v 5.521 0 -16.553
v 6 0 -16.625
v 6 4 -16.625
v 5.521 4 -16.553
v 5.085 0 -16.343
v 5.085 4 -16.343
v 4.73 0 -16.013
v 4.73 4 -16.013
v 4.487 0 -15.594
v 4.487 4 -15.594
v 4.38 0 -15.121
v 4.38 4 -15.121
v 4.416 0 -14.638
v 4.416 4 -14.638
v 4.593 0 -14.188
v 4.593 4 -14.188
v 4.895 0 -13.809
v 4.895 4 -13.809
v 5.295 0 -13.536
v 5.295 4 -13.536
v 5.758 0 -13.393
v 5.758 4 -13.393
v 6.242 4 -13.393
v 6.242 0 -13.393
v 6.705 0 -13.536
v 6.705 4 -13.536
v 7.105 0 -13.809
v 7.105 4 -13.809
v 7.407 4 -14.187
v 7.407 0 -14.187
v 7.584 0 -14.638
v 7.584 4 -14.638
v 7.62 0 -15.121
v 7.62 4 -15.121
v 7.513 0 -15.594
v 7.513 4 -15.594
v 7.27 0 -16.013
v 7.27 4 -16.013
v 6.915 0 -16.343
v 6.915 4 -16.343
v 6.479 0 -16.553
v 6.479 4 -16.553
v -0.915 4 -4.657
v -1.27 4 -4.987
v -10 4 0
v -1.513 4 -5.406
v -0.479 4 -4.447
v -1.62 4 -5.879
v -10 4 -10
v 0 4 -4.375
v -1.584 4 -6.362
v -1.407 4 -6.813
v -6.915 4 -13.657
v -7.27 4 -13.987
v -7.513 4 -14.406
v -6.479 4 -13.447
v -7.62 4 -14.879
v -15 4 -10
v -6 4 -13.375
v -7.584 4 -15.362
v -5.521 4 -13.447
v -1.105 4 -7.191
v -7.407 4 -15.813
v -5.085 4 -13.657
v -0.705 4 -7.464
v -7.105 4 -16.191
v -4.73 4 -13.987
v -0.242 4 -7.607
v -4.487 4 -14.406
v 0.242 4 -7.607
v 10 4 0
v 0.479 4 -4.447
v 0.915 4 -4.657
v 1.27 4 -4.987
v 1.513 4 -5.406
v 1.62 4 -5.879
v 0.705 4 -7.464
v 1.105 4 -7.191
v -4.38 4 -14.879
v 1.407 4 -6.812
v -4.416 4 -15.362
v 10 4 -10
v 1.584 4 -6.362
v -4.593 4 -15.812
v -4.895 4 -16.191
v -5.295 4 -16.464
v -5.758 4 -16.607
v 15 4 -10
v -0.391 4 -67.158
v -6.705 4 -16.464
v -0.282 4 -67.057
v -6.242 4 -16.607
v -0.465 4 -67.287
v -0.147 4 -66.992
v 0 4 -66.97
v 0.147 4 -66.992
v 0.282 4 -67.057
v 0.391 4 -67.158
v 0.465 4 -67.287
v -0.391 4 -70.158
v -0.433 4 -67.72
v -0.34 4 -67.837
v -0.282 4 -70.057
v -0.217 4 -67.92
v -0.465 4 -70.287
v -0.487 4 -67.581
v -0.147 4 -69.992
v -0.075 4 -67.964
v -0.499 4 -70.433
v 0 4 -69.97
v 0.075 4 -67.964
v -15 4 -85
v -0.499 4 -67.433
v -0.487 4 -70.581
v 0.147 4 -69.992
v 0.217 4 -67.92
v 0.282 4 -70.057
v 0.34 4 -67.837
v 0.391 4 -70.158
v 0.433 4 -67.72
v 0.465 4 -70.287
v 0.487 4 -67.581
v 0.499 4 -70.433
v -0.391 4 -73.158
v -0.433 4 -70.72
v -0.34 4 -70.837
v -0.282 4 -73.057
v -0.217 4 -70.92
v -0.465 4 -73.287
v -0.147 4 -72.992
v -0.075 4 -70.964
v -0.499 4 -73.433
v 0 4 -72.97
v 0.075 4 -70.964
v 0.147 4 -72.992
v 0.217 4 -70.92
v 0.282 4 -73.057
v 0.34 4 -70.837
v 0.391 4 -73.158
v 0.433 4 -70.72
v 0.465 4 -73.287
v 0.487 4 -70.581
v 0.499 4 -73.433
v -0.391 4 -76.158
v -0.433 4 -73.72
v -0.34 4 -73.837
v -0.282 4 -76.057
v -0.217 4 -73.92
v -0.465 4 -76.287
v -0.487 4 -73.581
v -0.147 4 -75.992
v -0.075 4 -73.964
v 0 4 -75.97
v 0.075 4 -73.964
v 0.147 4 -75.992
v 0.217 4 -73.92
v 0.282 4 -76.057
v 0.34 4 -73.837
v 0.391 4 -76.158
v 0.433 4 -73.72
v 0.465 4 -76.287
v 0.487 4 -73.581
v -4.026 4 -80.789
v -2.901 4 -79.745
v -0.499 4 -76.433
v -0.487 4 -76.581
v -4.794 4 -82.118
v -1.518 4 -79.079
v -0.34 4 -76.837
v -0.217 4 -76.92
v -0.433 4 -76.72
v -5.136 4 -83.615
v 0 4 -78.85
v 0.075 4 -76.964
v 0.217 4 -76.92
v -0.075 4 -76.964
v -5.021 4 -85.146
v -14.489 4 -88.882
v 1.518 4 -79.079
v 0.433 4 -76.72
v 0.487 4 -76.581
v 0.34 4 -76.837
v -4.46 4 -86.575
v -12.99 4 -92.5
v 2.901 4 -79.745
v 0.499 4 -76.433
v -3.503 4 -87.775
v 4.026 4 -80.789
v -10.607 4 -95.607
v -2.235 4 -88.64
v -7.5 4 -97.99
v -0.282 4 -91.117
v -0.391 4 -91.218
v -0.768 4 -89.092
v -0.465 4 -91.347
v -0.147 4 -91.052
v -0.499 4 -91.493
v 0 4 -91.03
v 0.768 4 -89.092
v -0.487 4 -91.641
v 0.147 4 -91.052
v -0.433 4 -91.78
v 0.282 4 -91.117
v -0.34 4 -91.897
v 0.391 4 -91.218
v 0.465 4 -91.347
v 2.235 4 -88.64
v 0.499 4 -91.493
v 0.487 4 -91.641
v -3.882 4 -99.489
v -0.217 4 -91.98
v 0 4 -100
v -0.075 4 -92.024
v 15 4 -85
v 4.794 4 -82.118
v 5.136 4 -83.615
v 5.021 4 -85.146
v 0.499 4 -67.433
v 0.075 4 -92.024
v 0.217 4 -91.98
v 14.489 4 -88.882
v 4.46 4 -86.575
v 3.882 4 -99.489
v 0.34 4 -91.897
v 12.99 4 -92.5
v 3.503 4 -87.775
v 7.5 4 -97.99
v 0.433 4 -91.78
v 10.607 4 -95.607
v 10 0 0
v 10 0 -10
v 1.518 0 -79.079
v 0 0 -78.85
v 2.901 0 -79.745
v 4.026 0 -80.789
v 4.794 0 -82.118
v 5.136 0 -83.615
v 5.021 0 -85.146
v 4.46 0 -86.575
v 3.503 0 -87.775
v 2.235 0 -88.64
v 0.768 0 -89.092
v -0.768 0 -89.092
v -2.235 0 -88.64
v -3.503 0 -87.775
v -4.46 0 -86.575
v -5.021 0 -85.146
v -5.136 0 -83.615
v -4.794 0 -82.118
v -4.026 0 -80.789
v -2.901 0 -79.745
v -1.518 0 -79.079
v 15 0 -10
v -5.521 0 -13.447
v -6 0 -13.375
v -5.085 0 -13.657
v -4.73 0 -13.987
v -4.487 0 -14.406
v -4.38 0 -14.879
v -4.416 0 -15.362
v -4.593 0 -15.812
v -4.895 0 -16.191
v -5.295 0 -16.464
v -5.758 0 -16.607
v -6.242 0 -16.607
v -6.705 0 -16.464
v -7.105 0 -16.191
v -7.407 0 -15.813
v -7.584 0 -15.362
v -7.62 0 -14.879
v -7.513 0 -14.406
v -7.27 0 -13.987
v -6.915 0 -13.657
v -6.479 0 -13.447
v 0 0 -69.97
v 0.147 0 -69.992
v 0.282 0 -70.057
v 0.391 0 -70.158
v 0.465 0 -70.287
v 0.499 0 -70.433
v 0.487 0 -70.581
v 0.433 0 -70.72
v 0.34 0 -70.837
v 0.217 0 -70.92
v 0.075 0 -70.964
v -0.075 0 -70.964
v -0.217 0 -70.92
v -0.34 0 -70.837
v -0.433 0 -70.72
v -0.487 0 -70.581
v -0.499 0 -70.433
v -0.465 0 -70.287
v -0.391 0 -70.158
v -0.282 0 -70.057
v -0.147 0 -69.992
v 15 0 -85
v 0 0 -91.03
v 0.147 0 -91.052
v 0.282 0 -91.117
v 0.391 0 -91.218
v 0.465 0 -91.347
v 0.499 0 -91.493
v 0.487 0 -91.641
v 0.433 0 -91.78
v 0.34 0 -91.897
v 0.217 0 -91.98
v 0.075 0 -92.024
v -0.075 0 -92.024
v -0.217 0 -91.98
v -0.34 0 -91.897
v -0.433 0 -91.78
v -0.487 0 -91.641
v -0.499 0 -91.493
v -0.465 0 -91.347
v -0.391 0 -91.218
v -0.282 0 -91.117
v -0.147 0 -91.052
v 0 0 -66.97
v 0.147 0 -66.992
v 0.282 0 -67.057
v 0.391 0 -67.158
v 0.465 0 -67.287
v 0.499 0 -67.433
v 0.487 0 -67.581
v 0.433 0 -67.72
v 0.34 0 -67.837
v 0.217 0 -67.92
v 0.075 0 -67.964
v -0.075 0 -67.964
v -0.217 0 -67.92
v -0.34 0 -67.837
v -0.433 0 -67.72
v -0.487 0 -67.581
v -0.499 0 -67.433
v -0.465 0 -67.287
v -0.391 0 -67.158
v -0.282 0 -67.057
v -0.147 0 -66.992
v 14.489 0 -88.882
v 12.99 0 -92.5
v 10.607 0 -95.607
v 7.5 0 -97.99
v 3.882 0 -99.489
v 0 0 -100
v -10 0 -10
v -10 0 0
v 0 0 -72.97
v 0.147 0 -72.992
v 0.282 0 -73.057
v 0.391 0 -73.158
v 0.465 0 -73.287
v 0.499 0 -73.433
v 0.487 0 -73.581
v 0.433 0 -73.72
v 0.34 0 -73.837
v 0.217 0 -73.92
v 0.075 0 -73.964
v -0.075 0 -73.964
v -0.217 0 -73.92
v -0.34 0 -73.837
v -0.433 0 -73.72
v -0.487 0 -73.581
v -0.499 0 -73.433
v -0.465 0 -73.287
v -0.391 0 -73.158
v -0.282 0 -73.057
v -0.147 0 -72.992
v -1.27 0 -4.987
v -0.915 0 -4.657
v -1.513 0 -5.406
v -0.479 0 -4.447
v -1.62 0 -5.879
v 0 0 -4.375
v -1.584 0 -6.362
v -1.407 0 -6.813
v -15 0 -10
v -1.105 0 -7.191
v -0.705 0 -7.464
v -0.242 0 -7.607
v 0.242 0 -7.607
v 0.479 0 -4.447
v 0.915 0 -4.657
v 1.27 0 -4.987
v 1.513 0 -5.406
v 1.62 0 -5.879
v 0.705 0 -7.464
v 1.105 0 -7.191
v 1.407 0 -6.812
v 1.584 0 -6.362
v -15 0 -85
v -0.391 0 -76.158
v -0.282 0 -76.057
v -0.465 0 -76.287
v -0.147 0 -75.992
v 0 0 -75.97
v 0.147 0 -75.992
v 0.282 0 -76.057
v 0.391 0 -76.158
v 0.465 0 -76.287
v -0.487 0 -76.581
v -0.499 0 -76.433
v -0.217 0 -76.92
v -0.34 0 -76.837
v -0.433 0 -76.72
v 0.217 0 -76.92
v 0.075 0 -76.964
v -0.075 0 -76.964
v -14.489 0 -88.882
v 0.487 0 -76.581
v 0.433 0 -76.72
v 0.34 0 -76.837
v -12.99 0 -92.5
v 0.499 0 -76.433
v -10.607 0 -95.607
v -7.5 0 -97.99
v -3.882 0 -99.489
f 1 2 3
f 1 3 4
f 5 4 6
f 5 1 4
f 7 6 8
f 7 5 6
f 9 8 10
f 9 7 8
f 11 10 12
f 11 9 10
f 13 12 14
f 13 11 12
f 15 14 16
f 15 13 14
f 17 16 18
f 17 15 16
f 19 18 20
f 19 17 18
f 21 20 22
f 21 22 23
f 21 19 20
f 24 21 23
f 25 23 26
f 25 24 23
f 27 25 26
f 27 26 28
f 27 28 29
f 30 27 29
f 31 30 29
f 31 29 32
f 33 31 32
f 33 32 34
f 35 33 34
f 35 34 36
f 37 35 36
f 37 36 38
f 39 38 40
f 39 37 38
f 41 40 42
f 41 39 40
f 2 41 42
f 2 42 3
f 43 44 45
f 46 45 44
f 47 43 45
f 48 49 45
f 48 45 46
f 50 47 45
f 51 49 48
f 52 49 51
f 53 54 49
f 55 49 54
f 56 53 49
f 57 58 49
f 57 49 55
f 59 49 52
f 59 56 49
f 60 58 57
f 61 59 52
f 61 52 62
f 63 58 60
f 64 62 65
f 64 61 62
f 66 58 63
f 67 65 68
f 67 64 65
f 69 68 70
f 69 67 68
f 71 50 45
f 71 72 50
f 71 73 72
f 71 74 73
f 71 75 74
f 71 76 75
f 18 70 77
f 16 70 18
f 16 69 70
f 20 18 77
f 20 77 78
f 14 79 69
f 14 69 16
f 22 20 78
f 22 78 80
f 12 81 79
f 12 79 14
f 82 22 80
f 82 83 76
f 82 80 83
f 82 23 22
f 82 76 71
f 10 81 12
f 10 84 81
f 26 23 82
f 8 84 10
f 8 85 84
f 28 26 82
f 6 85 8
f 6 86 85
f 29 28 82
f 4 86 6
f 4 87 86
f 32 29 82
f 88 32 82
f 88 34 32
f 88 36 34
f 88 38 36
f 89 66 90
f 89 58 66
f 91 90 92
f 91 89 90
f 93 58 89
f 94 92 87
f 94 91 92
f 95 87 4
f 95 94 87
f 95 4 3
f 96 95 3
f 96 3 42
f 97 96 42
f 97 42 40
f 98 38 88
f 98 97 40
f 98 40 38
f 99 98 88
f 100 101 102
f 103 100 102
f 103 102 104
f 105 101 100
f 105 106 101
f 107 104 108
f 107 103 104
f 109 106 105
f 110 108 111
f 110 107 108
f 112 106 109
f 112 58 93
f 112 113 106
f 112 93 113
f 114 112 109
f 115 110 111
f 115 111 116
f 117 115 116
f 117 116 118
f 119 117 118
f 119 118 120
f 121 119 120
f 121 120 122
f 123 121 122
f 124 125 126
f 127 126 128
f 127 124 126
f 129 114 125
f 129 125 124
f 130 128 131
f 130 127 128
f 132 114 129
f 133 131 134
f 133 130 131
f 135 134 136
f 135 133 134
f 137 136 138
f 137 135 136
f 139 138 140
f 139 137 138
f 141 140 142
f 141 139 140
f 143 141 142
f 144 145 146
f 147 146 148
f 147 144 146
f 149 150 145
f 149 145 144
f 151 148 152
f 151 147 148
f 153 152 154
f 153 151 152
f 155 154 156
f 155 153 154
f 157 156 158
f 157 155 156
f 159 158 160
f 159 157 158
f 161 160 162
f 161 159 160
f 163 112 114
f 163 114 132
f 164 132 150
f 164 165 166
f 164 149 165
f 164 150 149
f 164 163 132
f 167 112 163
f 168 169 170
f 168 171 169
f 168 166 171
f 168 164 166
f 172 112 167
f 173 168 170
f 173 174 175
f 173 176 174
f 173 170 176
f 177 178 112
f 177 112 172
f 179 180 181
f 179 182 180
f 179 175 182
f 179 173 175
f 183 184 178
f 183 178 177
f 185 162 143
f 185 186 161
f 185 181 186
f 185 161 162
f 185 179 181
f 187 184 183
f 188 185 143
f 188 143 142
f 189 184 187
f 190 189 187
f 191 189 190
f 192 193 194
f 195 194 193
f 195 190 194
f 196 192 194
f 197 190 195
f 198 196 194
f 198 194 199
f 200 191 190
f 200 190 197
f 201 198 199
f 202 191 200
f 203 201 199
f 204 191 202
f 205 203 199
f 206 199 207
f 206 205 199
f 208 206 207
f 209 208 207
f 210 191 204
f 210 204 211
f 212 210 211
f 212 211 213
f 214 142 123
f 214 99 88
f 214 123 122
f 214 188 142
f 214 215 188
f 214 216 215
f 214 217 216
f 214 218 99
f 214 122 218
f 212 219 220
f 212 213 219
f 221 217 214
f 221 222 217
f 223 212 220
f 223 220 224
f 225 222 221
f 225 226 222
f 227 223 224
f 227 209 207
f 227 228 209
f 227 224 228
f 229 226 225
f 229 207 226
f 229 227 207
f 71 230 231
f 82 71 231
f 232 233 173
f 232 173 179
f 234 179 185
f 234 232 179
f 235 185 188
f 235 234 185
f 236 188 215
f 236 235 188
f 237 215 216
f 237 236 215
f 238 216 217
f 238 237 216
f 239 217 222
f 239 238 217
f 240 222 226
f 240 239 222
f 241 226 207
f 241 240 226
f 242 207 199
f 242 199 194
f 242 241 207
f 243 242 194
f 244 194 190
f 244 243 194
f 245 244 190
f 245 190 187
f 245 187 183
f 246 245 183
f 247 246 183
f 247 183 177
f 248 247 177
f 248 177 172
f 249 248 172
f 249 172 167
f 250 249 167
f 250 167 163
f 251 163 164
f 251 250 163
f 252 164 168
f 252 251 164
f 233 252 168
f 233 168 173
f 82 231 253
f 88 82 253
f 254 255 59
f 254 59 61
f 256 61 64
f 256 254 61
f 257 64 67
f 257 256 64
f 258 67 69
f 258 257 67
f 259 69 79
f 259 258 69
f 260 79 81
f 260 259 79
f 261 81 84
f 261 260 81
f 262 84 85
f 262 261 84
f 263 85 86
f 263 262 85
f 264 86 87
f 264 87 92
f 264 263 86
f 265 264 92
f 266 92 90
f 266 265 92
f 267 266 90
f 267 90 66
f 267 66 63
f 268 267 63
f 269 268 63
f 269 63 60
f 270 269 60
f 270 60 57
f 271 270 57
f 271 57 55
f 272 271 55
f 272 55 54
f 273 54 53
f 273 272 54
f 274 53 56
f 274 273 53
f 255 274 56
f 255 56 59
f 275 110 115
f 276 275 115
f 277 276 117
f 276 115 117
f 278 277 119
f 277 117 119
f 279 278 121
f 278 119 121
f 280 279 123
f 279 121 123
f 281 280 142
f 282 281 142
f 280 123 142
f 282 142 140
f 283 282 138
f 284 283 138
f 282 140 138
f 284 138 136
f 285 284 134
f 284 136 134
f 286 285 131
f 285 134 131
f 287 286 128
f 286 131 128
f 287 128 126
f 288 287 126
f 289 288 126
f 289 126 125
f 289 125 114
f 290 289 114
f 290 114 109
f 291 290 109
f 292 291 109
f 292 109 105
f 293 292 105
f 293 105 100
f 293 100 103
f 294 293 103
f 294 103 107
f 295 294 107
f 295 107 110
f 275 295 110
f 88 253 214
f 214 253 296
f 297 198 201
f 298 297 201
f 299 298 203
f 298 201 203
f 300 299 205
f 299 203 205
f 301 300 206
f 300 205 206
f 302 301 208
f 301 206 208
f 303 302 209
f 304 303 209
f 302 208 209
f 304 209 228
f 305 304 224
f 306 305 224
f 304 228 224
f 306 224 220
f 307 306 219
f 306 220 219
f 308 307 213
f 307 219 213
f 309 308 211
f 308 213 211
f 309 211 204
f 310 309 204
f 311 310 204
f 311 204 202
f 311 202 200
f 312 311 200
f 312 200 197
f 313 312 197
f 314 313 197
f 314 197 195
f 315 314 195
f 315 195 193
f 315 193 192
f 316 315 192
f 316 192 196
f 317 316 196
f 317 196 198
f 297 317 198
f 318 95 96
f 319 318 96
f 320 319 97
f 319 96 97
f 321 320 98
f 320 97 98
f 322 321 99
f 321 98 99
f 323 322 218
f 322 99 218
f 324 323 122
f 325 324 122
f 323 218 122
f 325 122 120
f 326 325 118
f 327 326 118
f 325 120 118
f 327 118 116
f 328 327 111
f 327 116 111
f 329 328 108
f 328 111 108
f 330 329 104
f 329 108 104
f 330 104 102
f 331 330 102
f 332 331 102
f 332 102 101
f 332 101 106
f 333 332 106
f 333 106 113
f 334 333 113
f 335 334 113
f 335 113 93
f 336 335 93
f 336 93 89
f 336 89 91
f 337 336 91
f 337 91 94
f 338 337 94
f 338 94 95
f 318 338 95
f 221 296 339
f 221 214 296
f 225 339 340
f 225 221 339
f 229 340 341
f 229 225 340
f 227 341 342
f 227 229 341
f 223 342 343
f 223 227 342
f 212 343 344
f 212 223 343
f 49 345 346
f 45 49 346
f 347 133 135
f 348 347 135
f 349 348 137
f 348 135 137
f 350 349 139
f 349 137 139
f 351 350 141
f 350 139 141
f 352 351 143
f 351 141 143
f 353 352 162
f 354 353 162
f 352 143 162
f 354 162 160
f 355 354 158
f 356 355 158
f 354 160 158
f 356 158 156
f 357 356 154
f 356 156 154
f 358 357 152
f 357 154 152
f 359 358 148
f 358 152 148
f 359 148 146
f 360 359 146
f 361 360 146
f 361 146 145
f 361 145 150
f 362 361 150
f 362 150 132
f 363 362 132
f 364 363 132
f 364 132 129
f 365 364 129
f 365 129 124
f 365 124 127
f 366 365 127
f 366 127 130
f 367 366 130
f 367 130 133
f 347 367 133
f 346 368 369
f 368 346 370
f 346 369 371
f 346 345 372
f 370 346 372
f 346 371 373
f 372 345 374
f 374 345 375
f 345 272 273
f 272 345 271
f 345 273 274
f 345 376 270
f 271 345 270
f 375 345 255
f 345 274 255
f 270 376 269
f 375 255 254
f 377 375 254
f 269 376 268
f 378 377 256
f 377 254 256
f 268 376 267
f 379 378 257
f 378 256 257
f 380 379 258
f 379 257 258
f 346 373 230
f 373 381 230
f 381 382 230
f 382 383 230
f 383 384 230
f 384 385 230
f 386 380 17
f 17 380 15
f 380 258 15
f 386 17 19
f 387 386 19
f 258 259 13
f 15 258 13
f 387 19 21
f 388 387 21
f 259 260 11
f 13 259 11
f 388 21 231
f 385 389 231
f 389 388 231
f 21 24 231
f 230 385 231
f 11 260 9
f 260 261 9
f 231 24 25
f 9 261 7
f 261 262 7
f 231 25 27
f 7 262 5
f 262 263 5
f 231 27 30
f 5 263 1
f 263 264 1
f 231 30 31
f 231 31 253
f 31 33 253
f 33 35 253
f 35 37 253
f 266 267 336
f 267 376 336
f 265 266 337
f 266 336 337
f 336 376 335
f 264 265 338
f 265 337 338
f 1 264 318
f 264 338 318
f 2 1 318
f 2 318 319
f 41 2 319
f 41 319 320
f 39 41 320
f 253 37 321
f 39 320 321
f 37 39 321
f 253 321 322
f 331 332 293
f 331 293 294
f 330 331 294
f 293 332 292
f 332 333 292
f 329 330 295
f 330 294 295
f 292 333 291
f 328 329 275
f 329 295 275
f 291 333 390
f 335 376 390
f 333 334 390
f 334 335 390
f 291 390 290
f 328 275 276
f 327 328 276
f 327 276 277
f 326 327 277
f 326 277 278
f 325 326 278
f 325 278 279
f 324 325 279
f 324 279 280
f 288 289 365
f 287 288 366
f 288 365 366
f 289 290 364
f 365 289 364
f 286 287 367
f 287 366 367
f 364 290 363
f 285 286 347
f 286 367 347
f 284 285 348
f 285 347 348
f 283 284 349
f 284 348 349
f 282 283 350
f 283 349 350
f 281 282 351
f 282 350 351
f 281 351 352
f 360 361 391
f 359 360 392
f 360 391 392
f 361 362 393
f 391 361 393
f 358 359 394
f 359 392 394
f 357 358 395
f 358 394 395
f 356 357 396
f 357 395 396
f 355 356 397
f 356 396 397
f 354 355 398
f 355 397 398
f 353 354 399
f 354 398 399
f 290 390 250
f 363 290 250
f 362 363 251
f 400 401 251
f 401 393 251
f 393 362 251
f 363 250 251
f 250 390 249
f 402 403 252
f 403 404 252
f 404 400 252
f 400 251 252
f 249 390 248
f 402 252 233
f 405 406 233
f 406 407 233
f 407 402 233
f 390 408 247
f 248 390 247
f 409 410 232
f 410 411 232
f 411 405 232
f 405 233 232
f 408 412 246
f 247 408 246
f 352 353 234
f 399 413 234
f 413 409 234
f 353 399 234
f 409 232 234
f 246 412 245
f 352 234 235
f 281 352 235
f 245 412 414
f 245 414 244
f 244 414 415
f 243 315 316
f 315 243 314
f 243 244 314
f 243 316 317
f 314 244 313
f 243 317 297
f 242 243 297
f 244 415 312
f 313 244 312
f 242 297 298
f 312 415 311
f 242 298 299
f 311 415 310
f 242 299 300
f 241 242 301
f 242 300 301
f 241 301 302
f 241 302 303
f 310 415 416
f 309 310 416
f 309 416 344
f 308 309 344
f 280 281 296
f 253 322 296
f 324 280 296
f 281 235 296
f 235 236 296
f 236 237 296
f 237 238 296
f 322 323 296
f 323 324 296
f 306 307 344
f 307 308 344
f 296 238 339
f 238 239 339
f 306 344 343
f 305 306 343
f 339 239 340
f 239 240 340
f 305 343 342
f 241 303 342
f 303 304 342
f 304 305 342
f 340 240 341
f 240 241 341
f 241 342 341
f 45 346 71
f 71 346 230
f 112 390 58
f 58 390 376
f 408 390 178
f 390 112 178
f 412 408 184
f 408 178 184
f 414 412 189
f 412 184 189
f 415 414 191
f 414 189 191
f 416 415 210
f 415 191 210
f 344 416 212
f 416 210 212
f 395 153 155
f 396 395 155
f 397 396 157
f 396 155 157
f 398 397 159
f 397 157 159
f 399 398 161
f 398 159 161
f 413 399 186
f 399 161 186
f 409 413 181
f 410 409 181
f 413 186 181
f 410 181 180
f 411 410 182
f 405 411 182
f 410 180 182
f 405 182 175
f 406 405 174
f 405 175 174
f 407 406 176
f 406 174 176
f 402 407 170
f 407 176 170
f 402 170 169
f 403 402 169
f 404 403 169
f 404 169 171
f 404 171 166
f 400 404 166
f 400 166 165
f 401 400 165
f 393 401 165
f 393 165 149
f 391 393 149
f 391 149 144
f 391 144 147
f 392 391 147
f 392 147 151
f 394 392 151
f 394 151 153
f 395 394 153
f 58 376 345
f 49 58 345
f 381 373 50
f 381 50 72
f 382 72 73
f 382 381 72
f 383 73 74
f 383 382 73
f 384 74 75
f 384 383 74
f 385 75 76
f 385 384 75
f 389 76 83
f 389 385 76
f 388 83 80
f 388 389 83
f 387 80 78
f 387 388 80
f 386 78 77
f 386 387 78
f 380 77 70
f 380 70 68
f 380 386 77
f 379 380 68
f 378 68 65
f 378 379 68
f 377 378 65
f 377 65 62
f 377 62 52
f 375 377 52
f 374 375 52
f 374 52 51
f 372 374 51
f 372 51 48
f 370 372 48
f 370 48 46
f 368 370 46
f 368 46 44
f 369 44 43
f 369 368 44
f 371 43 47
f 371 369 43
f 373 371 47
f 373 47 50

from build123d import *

# Parameters (mm, degrees)
SKETCH_1_R          = 1.625
SKETCH_1_R_2        = 5.15
EXTRUDE_1_DEPTH     = 4
FILLET_1_R          = 15
SKETCH_3_R          = 0.5
CUT_EXTRUDE_1_DEPTH = 102.197826064


with BuildPart() as part:
    # Эскиз1 → Бобышка-Вытянуть1 (new body)
    with BuildSketch(Plane(origin=(0, 0, 0), x_dir=(1, 0, 0), z_dir=(0, 1, 0))):
        Polygon((-10, 0), (10, 0), (10, 10), (15, 10), (15, 100), (-15, 100), (-15, 10), (-10, 10), align=None)
        with Locations(Location((-6, 15, 0), (0, 0, 270))):
            Circle(SKETCH_1_R, mode=Mode.SUBTRACT)
        with Locations(Location((0, 6, 0), (0, 0, 270))):
            Circle(SKETCH_1_R, mode=Mode.SUBTRACT)
        with Locations(Location((6, 15, 0), (0, 0, 90))):
            Circle(SKETCH_1_R, mode=Mode.SUBTRACT)
        with Locations(Location((0, 84, 0), (0, 0, 270))):
            Circle(SKETCH_1_R_2, mode=Mode.SUBTRACT)
    extrude(amount=EXTRUDE_1_DEPTH)

    # Скругление1
    fillet_1_edges = [part.edges().sort_by_distance(p)[0] for p in [
        (15, 2, -100),
        (-15, 2, -100),
    ]]
    fillet(fillet_1_edges, radius=FILLET_1_R - 0.0001)  # a hair under: the kernel refuses the full size

    # Эскиз3 → Вырез-Вытянуть1 (cut, through all)
    with BuildSketch(Plane(origin=(0, 4, 0), x_dir=(1, 0, 0), z_dir=(0, 1, 0))):
        with Locations(Location((0, 76.47, 0), (0, 0, 270))):
            Circle(SKETCH_3_R)
        with Locations(Location((0, 73.47, 0), (0, 0, 270))):
            Circle(SKETCH_3_R)
        with Locations(Location((0, 70.47, 0), (0, 0, 270))):
            Circle(SKETCH_3_R)
        with Locations(Location((0, 67.47, 0), (0, 0, 270))):
            Circle(SKETCH_3_R)
        with Locations(Location((0, 91.53, 0), (0, 0, 270))):
            Circle(SKETCH_3_R)
    extrude(amount=-CUT_EXTRUDE_1_DEPTH, mode=Mode.SUBTRACT)


solid = part.part
